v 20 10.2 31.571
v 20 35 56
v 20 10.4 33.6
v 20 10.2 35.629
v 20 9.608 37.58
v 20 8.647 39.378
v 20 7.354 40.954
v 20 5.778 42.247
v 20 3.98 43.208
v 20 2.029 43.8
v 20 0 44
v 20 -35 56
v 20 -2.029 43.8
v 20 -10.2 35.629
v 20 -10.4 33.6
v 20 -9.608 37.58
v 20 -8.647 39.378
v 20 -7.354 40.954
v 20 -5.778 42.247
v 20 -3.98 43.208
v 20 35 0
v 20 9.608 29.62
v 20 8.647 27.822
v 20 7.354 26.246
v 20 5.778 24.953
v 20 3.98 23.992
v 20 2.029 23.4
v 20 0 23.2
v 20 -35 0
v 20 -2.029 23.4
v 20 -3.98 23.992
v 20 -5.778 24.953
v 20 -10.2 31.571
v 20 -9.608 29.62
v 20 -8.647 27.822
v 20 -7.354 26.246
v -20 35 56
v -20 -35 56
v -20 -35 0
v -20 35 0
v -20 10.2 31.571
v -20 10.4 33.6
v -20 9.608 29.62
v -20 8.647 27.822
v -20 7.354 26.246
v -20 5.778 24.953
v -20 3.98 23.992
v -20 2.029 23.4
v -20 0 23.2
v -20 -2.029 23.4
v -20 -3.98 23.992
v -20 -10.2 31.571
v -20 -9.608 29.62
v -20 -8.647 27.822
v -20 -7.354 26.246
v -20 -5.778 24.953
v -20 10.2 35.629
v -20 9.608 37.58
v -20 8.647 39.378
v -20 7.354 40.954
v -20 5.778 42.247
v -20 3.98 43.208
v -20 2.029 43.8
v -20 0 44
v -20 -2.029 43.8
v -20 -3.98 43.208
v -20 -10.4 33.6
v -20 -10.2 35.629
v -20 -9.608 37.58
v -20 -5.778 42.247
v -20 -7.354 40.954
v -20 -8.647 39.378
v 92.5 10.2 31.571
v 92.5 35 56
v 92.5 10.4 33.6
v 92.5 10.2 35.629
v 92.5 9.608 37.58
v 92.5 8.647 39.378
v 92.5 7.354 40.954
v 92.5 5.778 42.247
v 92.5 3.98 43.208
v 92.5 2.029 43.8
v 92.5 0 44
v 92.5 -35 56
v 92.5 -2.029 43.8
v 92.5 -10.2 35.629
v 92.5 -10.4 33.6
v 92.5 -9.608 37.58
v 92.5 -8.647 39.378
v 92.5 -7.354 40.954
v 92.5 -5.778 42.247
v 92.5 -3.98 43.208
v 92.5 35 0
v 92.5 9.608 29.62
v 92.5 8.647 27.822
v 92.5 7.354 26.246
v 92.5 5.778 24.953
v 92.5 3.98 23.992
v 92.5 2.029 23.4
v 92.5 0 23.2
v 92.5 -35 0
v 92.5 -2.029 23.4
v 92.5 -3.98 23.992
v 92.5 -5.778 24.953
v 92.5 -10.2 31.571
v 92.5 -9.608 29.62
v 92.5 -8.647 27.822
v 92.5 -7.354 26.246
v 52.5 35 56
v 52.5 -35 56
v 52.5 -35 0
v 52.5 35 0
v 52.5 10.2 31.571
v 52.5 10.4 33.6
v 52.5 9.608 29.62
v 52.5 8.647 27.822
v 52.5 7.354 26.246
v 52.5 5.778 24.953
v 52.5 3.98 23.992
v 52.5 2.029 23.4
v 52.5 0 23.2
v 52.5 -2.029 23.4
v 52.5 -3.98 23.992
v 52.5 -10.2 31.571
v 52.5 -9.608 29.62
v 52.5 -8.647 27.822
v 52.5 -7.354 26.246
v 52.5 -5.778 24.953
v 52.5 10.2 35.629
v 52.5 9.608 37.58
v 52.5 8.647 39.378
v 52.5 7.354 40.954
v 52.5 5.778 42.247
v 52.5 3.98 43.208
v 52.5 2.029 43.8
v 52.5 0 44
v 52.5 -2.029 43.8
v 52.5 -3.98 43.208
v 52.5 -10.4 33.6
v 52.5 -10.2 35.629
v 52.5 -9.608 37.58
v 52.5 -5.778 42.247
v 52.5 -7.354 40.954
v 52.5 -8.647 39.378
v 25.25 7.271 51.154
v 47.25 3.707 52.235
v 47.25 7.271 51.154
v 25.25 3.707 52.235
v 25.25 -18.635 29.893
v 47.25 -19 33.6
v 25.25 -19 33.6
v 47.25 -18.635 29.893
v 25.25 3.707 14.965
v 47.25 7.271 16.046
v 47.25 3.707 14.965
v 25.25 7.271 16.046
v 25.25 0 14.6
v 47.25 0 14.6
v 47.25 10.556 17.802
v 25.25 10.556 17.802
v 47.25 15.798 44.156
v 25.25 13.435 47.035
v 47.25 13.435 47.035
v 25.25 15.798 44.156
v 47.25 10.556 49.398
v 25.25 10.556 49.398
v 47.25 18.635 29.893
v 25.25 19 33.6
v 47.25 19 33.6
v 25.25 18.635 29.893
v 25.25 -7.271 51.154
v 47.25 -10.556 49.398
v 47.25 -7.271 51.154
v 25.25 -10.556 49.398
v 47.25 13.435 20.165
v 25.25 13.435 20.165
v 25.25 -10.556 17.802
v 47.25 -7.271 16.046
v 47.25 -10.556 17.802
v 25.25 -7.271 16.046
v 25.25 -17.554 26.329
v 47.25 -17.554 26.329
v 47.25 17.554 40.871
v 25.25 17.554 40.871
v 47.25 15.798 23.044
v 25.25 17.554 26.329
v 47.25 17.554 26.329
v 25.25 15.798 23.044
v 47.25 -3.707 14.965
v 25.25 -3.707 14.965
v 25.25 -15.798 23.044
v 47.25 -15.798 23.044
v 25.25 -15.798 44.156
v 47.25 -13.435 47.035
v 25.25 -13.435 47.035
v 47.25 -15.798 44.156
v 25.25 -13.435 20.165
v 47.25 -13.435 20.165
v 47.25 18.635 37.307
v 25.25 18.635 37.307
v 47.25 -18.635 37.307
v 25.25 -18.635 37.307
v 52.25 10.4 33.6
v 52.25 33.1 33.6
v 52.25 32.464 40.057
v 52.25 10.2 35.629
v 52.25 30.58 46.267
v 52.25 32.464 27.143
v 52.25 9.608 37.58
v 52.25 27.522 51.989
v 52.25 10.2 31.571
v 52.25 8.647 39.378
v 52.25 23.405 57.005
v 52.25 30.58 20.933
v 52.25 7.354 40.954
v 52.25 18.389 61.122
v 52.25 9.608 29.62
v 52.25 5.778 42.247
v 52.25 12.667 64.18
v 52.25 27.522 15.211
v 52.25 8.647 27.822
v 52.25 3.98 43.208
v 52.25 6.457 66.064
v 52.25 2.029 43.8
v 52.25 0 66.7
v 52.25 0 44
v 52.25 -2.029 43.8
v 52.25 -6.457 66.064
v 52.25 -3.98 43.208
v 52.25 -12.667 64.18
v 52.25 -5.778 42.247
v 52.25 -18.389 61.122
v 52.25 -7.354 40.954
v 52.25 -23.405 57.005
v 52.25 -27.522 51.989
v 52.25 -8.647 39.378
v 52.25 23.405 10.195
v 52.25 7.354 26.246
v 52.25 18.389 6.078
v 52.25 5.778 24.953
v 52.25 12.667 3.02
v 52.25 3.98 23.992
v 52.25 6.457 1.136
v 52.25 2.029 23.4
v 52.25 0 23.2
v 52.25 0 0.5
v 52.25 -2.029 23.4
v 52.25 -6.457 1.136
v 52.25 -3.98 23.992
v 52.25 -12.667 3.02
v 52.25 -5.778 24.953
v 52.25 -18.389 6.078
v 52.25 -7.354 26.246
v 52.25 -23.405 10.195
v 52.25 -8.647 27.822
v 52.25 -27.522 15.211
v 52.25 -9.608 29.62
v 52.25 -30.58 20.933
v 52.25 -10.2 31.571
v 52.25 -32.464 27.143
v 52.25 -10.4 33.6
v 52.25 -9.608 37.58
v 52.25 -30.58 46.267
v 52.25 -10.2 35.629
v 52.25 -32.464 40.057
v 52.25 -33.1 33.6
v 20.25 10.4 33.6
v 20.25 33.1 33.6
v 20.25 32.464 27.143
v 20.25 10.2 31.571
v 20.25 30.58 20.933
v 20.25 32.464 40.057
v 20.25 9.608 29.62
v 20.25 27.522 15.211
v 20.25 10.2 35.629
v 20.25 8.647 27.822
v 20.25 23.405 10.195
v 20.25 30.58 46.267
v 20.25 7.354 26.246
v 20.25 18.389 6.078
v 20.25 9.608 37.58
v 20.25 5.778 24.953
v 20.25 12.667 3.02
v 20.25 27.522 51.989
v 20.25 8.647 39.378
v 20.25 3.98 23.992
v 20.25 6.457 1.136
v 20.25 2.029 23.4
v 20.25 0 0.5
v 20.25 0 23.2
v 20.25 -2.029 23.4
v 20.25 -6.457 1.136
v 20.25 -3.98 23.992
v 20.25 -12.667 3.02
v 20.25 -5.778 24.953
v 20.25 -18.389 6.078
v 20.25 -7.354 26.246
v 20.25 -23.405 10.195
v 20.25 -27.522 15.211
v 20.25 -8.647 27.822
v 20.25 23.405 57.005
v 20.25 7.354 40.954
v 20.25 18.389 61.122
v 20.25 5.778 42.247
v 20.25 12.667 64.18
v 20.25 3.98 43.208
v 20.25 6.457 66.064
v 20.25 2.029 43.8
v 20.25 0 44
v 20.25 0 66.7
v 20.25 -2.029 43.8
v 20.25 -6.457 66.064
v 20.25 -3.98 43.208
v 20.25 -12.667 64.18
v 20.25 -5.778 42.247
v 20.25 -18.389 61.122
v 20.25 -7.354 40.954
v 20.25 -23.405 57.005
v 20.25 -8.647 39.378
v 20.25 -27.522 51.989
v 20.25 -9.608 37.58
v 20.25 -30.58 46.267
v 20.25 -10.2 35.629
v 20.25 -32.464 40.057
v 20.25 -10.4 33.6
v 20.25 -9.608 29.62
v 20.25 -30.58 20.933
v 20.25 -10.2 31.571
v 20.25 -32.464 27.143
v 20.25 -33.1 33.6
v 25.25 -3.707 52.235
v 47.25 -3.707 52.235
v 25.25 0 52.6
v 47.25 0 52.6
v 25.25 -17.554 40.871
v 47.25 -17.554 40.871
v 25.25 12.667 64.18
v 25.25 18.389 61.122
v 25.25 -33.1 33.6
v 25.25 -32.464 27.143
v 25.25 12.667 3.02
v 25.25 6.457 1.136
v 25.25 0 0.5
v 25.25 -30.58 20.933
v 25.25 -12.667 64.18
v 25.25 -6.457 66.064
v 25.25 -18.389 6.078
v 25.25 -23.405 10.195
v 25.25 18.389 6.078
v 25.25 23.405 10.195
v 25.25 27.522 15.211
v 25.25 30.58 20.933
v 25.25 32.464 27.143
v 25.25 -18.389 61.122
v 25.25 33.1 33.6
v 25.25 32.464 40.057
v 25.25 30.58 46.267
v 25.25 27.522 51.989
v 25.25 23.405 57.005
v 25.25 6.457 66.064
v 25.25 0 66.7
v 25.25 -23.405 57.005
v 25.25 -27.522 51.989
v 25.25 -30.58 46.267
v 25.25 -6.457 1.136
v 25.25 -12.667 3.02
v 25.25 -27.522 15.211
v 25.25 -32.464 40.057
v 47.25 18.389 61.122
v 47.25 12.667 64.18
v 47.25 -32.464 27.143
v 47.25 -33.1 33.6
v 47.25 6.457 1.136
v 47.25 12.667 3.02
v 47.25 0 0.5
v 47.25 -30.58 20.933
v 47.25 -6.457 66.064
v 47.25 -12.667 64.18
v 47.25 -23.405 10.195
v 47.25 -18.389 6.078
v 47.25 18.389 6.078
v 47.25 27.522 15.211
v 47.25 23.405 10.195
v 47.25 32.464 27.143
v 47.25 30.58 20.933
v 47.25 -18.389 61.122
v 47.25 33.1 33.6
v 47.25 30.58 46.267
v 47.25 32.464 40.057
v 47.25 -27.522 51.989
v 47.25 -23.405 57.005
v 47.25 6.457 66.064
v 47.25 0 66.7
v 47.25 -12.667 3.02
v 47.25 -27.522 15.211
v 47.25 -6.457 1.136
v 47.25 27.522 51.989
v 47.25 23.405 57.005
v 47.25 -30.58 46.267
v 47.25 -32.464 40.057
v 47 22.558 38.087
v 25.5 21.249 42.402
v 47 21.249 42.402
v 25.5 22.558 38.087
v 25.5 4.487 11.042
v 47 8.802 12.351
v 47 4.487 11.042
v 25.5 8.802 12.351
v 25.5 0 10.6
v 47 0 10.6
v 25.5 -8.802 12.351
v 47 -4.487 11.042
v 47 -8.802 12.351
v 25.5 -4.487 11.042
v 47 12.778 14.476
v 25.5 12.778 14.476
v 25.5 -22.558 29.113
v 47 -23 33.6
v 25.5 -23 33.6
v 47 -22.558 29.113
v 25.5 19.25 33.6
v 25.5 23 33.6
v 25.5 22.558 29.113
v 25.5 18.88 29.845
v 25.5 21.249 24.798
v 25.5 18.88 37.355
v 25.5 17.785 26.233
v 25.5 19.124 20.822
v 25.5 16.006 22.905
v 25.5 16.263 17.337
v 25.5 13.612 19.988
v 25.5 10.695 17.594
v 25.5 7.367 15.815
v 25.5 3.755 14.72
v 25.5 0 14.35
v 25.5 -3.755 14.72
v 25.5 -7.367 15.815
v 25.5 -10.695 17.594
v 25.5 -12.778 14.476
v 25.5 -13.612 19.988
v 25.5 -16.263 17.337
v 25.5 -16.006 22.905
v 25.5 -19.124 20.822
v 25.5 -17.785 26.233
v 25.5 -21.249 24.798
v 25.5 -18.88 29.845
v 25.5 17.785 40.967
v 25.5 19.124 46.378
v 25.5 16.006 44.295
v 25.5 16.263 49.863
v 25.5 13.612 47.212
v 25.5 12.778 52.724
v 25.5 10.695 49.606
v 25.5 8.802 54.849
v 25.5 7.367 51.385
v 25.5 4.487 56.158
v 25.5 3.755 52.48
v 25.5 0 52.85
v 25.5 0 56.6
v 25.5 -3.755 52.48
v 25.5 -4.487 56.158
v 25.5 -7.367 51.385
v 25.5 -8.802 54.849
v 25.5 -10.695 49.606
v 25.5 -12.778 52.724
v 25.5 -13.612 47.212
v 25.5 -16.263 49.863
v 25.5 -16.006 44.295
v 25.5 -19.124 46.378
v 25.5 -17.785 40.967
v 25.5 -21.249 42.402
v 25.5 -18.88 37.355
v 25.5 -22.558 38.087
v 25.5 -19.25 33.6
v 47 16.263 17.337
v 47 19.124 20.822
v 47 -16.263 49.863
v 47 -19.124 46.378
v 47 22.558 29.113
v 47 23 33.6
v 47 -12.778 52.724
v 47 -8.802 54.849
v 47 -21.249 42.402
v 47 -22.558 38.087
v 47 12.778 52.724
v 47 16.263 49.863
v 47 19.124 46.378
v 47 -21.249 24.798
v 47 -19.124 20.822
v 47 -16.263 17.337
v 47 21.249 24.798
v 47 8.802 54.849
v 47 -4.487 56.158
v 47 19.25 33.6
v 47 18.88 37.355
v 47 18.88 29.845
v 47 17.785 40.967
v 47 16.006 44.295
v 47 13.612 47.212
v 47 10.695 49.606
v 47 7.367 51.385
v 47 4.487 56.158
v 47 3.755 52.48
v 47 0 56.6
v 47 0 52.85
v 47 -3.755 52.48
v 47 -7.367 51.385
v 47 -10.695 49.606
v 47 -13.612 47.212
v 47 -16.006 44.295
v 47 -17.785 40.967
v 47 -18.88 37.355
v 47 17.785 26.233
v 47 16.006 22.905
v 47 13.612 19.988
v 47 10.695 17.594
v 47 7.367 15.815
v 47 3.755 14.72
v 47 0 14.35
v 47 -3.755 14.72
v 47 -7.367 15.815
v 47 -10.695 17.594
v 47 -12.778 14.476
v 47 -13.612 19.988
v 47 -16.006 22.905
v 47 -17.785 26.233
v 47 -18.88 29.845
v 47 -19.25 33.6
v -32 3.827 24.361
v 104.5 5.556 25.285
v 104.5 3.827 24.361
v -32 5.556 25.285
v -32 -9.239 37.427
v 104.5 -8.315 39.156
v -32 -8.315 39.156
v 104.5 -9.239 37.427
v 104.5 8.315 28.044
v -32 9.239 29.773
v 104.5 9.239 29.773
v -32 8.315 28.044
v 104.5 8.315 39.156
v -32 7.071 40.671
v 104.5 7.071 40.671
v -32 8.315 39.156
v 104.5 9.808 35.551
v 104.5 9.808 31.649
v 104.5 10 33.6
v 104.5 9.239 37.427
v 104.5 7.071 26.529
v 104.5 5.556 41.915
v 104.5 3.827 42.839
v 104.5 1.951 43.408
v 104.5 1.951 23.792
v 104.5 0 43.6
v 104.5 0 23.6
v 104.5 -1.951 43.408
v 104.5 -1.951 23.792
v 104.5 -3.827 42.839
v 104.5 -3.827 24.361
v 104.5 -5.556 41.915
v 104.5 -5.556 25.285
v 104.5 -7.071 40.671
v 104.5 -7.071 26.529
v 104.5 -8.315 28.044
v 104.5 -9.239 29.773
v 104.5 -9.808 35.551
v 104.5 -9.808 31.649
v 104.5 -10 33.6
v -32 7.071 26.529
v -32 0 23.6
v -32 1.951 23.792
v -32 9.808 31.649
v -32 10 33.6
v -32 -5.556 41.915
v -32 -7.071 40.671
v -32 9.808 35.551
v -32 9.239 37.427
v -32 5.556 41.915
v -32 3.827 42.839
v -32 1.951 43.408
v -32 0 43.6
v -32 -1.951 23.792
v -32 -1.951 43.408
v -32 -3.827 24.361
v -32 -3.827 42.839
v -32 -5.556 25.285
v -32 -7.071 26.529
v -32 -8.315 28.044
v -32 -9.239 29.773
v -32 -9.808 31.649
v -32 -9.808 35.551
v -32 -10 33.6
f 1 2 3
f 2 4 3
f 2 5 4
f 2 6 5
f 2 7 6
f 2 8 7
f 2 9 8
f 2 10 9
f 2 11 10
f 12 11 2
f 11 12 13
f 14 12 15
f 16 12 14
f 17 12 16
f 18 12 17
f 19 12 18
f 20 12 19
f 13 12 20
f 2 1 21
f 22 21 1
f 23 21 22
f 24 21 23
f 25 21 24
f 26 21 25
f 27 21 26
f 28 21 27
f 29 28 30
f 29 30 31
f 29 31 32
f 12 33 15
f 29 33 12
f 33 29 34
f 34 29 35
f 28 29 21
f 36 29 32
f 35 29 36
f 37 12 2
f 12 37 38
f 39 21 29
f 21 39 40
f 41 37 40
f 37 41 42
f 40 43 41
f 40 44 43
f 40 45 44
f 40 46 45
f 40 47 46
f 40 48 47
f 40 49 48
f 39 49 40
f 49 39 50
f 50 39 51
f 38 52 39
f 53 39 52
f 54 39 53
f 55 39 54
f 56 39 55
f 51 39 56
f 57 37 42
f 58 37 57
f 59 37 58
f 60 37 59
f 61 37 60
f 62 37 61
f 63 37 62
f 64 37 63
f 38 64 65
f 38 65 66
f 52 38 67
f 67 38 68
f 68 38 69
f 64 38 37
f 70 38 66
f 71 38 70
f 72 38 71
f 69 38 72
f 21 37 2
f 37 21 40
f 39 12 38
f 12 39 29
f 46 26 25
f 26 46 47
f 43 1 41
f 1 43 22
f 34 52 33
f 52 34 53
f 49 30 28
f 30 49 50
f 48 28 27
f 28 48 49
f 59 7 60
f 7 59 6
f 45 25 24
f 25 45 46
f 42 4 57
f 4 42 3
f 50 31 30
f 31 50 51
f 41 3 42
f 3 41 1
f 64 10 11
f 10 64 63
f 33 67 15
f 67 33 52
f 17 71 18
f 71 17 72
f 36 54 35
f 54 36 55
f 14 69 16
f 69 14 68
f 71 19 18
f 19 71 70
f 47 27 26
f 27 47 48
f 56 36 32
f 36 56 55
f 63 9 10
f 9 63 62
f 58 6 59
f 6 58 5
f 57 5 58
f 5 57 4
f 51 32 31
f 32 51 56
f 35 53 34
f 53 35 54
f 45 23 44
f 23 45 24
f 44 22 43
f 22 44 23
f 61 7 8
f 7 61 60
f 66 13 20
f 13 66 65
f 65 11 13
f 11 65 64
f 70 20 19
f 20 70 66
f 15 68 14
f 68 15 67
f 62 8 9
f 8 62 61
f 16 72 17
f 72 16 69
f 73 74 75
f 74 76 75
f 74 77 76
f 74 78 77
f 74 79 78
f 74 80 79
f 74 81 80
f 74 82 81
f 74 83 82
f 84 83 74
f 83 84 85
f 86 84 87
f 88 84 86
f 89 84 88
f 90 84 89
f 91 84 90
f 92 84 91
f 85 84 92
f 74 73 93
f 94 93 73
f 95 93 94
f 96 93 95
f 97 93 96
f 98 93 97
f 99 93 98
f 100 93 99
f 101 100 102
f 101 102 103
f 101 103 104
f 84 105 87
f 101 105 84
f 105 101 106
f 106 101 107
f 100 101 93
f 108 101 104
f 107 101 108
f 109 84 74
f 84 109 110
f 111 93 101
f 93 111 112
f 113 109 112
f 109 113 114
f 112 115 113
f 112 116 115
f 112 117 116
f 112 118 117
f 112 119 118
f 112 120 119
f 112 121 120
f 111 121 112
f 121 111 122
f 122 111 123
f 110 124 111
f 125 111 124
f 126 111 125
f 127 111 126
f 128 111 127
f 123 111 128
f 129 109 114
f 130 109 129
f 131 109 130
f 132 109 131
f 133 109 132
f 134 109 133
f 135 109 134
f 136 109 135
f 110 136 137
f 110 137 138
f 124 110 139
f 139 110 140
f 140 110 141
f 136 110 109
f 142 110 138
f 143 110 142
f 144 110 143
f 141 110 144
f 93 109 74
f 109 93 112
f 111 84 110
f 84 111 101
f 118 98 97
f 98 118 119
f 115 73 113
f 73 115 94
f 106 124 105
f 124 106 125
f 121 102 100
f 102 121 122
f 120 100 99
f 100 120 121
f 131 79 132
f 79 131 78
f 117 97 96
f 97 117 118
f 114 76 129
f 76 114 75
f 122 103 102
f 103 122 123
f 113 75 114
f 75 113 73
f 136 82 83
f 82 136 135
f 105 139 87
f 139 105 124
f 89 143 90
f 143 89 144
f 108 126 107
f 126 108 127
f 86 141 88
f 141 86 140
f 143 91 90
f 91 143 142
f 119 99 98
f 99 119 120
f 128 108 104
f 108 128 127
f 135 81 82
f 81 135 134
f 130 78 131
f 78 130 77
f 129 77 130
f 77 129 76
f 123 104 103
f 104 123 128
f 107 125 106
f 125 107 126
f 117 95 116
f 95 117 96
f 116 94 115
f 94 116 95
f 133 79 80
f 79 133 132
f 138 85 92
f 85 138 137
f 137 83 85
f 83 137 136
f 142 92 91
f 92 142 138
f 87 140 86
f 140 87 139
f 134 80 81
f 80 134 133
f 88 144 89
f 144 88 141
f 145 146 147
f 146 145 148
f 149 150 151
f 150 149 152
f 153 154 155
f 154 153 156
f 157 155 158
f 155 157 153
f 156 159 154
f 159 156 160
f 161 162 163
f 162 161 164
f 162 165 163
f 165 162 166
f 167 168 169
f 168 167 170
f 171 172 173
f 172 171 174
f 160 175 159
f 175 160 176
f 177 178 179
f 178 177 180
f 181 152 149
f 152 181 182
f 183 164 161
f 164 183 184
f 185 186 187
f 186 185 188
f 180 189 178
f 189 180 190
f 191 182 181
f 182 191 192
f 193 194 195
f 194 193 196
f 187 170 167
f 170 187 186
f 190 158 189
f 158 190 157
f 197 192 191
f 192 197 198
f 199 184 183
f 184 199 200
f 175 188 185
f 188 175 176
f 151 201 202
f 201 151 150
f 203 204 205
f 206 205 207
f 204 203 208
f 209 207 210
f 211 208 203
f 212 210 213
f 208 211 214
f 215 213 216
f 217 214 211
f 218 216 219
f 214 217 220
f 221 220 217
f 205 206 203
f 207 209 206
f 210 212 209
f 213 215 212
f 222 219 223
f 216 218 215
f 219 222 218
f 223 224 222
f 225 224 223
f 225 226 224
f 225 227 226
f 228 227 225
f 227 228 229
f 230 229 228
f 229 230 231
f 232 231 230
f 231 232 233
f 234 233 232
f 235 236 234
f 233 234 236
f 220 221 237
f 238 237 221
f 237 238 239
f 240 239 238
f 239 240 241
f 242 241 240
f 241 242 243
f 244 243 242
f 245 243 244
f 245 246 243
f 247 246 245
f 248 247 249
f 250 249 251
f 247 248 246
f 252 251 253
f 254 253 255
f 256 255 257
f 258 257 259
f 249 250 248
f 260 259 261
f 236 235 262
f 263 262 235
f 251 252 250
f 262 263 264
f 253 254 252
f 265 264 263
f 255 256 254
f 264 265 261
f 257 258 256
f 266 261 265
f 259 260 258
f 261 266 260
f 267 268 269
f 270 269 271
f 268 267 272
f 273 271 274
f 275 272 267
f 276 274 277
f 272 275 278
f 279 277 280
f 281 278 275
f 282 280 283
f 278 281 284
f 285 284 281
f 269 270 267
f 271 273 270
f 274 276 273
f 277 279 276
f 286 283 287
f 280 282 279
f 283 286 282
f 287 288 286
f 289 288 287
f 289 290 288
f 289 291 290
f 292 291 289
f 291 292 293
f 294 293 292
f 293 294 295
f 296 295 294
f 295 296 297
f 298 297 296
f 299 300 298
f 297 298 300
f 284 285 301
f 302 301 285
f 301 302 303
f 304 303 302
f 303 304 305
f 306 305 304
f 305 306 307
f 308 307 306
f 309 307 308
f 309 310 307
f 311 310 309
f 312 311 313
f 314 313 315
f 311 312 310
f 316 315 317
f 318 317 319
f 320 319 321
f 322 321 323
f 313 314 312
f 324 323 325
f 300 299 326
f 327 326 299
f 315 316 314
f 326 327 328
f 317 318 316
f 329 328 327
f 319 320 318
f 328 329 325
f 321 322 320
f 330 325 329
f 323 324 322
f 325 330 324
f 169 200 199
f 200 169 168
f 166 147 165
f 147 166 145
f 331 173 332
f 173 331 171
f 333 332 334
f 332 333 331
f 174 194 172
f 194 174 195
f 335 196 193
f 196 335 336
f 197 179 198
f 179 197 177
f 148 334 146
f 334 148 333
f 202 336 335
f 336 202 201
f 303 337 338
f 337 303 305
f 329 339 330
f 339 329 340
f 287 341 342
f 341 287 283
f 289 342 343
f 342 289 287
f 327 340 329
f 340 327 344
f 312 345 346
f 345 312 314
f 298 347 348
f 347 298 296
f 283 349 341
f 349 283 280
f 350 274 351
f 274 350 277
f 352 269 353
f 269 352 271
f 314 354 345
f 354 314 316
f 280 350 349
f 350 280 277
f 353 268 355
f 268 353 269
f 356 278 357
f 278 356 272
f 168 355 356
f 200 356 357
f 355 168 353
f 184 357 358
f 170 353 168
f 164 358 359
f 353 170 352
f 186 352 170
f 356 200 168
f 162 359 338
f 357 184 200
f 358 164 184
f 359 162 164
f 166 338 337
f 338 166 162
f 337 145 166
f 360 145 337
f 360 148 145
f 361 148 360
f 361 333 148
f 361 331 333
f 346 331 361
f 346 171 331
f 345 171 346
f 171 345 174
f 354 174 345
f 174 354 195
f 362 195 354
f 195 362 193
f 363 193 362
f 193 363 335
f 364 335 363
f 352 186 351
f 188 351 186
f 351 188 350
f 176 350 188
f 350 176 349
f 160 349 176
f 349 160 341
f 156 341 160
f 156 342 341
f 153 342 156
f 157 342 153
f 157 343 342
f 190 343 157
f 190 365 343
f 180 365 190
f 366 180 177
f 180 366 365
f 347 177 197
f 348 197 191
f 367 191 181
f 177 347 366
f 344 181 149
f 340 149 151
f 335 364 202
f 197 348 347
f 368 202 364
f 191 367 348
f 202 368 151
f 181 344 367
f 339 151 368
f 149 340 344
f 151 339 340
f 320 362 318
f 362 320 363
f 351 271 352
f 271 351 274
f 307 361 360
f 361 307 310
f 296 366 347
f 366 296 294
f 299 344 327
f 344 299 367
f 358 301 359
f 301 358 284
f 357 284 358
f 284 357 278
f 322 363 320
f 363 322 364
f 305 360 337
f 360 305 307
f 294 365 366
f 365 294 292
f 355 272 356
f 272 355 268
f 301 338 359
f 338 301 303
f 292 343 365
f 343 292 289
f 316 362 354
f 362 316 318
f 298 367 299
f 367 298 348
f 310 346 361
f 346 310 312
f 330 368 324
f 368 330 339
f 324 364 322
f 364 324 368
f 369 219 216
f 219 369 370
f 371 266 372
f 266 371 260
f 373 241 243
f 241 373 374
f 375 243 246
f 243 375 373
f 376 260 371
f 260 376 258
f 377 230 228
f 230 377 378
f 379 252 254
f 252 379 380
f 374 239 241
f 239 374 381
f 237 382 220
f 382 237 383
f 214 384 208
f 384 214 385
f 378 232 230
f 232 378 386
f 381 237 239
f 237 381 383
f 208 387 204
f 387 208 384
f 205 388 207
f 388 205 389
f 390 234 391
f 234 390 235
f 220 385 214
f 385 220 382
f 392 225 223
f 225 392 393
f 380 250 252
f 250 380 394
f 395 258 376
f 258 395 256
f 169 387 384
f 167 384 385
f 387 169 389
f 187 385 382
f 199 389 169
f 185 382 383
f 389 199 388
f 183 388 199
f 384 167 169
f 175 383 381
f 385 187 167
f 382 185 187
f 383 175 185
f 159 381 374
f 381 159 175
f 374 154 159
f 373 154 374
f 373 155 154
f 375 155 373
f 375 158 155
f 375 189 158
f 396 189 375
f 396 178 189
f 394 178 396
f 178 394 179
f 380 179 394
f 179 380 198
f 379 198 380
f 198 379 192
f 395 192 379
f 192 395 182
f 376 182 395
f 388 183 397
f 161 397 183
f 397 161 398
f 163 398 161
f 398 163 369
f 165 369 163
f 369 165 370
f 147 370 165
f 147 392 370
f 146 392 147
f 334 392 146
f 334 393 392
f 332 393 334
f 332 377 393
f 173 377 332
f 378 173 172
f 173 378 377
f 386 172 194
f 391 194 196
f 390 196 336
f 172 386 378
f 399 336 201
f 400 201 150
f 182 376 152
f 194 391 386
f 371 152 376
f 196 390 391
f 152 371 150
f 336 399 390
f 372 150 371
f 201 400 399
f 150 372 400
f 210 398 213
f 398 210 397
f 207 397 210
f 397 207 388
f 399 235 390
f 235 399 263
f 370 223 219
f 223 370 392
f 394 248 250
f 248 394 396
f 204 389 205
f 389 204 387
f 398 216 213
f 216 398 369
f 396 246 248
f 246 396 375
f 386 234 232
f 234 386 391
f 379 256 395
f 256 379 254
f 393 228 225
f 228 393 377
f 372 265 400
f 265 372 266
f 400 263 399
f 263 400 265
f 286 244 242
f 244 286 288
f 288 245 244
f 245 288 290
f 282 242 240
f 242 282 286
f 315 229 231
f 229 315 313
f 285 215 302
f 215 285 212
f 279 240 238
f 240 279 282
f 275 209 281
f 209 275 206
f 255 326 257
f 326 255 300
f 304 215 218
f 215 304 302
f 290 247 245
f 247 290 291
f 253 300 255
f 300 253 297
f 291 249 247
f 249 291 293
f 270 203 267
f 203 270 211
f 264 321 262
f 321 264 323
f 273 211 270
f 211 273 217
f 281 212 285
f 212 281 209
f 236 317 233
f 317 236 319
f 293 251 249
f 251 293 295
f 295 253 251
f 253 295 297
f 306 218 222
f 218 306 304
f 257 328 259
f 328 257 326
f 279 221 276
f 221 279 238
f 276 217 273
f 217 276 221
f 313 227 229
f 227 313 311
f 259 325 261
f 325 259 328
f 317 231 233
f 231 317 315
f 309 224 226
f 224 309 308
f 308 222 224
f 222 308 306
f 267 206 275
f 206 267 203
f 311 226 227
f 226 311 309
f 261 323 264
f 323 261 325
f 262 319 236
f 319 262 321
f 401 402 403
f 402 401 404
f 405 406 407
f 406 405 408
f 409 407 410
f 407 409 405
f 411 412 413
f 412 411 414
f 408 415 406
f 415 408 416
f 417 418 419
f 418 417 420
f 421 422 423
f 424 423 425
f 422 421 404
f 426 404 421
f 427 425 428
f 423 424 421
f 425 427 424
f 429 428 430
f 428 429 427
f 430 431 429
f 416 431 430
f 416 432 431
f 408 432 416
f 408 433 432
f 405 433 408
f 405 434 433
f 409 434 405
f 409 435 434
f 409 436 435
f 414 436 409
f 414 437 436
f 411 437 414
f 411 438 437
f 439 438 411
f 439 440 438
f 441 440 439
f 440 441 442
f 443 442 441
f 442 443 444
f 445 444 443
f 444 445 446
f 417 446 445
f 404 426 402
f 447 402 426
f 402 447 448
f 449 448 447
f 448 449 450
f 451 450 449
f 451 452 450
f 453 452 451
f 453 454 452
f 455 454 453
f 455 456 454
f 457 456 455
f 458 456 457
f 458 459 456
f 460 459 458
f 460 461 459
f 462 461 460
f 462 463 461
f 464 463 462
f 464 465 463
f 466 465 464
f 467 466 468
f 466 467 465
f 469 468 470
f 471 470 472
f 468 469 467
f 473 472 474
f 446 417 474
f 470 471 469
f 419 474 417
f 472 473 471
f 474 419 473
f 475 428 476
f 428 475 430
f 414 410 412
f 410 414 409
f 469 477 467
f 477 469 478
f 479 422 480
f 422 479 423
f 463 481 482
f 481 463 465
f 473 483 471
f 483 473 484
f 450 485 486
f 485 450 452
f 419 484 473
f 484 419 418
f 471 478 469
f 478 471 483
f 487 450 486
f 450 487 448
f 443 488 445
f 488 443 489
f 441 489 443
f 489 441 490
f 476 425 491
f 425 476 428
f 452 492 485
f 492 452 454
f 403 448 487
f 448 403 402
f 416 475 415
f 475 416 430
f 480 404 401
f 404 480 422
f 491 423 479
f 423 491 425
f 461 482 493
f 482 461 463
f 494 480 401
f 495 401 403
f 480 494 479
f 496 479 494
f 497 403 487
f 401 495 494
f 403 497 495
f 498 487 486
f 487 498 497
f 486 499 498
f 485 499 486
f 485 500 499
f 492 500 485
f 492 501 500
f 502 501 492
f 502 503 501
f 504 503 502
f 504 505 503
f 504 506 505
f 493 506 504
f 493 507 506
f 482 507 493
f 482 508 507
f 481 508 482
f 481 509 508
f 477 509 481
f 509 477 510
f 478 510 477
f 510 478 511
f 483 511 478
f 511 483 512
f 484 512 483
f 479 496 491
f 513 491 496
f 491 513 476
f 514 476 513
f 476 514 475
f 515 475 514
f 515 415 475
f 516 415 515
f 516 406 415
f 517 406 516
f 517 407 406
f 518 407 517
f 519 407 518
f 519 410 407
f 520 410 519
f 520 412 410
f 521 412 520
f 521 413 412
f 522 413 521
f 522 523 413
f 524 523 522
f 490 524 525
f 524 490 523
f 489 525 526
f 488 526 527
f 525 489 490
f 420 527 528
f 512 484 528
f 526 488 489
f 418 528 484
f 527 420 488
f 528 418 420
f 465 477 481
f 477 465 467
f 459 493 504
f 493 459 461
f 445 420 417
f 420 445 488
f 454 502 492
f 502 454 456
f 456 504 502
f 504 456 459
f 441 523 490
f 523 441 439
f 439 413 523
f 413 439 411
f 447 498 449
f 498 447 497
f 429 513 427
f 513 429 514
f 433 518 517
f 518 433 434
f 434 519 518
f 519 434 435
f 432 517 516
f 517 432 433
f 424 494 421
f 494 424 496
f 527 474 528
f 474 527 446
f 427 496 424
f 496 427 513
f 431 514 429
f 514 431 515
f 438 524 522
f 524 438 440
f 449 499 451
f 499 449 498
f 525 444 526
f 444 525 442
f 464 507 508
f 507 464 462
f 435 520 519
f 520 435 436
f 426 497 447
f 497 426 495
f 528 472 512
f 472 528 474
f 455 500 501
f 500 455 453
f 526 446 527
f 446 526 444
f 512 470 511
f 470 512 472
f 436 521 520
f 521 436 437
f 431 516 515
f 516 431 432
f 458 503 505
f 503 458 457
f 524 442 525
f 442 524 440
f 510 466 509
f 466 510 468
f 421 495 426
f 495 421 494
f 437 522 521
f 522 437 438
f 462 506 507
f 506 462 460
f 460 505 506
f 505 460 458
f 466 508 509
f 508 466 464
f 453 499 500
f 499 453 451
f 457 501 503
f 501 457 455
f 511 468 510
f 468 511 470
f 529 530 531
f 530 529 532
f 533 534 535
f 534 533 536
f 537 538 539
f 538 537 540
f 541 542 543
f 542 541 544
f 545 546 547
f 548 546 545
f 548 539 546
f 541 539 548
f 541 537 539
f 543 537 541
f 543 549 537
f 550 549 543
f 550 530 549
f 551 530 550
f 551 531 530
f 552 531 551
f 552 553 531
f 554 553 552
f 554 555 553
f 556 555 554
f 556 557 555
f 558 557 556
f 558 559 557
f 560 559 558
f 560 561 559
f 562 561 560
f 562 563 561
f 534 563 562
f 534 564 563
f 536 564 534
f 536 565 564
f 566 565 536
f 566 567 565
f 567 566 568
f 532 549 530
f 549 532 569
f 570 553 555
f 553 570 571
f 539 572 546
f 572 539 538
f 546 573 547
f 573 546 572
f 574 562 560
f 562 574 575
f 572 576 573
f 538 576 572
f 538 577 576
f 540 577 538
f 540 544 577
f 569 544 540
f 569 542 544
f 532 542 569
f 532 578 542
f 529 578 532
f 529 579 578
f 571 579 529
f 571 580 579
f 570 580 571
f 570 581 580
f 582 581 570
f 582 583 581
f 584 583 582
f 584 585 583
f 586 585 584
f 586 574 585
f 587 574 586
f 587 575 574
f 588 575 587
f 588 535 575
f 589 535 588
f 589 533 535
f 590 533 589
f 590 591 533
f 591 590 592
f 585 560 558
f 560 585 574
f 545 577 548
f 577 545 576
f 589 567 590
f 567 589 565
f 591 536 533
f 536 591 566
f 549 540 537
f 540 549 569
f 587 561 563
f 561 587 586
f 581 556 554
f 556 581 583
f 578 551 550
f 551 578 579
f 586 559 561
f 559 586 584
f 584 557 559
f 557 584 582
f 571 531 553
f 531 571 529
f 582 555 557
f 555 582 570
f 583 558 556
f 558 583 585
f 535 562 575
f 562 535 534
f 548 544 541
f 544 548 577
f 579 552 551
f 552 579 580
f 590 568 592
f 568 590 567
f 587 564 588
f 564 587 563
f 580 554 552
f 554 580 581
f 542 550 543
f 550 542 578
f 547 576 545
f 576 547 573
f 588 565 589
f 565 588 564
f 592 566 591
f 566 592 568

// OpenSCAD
$fn = 32;

// ------------------------------------------------------------------------
// Pulley assembly: d66.2 pulley with a belt, shaft d20
// Every part is its own module, assembly() places them once.
// ------------------------------------------------------------------------

// --- part 1 ---
module support1() {
  difference() {
    translate([-20, -35, 0]) cube([40, 70, 56]);
    translate([0, 0, 33.6]) rotate([0, 90, 0]) cylinder(h = 42, d = 20.8, center = true);
  }
}

// --- part 2 ---
module support2() {
  difference() {
    translate([-20, -35, 0]) cube([40, 70, 56]);
    translate([0, 0, 33.6]) rotate([0, 90, 0]) cylinder(h = 42, d = 20.8, center = true);
  }
}

// --- part 3 ---
module shaft() {
  translate([0, 0, -68.25]) cylinder(h = 136.5, d = 20);
}

// --- part 4 ---
module pulley() {
  difference() {
    union() {
      cylinder(h = 32, d = 38);
      cylinder(h = 5, d = 66.2);
      translate([0, 0, 27]) cylinder(h = 5, d = 66.2);
    }
    translate([0, 0, -1]) cylinder(h = 34, d = 20.8);
  }
}

// --- part 5 ---
module belt() {
  difference() {
      translate([0, 0, 0]) cylinder(h = 21.5, d = 46);
      translate([0, 0, -1]) cylinder(h = 23.5, d = 38.5);
    }
}

// --- assembly ---
module assembly() {
  translate([0, 0, 0]) rotate([0, 0, 0]) support1();
  translate([72.5, 0, 0]) rotate([0, 0, 0]) support2();
  translate([36.25, 0, 33.6]) rotate([0, 90, 0]) shaft();
  translate([20.25, 0, 33.6]) rotate([0, 90, 0]) pulley();
  translate([25.5, 0, 33.6]) rotate([0, 90, 0]) belt();
}

assembly();
